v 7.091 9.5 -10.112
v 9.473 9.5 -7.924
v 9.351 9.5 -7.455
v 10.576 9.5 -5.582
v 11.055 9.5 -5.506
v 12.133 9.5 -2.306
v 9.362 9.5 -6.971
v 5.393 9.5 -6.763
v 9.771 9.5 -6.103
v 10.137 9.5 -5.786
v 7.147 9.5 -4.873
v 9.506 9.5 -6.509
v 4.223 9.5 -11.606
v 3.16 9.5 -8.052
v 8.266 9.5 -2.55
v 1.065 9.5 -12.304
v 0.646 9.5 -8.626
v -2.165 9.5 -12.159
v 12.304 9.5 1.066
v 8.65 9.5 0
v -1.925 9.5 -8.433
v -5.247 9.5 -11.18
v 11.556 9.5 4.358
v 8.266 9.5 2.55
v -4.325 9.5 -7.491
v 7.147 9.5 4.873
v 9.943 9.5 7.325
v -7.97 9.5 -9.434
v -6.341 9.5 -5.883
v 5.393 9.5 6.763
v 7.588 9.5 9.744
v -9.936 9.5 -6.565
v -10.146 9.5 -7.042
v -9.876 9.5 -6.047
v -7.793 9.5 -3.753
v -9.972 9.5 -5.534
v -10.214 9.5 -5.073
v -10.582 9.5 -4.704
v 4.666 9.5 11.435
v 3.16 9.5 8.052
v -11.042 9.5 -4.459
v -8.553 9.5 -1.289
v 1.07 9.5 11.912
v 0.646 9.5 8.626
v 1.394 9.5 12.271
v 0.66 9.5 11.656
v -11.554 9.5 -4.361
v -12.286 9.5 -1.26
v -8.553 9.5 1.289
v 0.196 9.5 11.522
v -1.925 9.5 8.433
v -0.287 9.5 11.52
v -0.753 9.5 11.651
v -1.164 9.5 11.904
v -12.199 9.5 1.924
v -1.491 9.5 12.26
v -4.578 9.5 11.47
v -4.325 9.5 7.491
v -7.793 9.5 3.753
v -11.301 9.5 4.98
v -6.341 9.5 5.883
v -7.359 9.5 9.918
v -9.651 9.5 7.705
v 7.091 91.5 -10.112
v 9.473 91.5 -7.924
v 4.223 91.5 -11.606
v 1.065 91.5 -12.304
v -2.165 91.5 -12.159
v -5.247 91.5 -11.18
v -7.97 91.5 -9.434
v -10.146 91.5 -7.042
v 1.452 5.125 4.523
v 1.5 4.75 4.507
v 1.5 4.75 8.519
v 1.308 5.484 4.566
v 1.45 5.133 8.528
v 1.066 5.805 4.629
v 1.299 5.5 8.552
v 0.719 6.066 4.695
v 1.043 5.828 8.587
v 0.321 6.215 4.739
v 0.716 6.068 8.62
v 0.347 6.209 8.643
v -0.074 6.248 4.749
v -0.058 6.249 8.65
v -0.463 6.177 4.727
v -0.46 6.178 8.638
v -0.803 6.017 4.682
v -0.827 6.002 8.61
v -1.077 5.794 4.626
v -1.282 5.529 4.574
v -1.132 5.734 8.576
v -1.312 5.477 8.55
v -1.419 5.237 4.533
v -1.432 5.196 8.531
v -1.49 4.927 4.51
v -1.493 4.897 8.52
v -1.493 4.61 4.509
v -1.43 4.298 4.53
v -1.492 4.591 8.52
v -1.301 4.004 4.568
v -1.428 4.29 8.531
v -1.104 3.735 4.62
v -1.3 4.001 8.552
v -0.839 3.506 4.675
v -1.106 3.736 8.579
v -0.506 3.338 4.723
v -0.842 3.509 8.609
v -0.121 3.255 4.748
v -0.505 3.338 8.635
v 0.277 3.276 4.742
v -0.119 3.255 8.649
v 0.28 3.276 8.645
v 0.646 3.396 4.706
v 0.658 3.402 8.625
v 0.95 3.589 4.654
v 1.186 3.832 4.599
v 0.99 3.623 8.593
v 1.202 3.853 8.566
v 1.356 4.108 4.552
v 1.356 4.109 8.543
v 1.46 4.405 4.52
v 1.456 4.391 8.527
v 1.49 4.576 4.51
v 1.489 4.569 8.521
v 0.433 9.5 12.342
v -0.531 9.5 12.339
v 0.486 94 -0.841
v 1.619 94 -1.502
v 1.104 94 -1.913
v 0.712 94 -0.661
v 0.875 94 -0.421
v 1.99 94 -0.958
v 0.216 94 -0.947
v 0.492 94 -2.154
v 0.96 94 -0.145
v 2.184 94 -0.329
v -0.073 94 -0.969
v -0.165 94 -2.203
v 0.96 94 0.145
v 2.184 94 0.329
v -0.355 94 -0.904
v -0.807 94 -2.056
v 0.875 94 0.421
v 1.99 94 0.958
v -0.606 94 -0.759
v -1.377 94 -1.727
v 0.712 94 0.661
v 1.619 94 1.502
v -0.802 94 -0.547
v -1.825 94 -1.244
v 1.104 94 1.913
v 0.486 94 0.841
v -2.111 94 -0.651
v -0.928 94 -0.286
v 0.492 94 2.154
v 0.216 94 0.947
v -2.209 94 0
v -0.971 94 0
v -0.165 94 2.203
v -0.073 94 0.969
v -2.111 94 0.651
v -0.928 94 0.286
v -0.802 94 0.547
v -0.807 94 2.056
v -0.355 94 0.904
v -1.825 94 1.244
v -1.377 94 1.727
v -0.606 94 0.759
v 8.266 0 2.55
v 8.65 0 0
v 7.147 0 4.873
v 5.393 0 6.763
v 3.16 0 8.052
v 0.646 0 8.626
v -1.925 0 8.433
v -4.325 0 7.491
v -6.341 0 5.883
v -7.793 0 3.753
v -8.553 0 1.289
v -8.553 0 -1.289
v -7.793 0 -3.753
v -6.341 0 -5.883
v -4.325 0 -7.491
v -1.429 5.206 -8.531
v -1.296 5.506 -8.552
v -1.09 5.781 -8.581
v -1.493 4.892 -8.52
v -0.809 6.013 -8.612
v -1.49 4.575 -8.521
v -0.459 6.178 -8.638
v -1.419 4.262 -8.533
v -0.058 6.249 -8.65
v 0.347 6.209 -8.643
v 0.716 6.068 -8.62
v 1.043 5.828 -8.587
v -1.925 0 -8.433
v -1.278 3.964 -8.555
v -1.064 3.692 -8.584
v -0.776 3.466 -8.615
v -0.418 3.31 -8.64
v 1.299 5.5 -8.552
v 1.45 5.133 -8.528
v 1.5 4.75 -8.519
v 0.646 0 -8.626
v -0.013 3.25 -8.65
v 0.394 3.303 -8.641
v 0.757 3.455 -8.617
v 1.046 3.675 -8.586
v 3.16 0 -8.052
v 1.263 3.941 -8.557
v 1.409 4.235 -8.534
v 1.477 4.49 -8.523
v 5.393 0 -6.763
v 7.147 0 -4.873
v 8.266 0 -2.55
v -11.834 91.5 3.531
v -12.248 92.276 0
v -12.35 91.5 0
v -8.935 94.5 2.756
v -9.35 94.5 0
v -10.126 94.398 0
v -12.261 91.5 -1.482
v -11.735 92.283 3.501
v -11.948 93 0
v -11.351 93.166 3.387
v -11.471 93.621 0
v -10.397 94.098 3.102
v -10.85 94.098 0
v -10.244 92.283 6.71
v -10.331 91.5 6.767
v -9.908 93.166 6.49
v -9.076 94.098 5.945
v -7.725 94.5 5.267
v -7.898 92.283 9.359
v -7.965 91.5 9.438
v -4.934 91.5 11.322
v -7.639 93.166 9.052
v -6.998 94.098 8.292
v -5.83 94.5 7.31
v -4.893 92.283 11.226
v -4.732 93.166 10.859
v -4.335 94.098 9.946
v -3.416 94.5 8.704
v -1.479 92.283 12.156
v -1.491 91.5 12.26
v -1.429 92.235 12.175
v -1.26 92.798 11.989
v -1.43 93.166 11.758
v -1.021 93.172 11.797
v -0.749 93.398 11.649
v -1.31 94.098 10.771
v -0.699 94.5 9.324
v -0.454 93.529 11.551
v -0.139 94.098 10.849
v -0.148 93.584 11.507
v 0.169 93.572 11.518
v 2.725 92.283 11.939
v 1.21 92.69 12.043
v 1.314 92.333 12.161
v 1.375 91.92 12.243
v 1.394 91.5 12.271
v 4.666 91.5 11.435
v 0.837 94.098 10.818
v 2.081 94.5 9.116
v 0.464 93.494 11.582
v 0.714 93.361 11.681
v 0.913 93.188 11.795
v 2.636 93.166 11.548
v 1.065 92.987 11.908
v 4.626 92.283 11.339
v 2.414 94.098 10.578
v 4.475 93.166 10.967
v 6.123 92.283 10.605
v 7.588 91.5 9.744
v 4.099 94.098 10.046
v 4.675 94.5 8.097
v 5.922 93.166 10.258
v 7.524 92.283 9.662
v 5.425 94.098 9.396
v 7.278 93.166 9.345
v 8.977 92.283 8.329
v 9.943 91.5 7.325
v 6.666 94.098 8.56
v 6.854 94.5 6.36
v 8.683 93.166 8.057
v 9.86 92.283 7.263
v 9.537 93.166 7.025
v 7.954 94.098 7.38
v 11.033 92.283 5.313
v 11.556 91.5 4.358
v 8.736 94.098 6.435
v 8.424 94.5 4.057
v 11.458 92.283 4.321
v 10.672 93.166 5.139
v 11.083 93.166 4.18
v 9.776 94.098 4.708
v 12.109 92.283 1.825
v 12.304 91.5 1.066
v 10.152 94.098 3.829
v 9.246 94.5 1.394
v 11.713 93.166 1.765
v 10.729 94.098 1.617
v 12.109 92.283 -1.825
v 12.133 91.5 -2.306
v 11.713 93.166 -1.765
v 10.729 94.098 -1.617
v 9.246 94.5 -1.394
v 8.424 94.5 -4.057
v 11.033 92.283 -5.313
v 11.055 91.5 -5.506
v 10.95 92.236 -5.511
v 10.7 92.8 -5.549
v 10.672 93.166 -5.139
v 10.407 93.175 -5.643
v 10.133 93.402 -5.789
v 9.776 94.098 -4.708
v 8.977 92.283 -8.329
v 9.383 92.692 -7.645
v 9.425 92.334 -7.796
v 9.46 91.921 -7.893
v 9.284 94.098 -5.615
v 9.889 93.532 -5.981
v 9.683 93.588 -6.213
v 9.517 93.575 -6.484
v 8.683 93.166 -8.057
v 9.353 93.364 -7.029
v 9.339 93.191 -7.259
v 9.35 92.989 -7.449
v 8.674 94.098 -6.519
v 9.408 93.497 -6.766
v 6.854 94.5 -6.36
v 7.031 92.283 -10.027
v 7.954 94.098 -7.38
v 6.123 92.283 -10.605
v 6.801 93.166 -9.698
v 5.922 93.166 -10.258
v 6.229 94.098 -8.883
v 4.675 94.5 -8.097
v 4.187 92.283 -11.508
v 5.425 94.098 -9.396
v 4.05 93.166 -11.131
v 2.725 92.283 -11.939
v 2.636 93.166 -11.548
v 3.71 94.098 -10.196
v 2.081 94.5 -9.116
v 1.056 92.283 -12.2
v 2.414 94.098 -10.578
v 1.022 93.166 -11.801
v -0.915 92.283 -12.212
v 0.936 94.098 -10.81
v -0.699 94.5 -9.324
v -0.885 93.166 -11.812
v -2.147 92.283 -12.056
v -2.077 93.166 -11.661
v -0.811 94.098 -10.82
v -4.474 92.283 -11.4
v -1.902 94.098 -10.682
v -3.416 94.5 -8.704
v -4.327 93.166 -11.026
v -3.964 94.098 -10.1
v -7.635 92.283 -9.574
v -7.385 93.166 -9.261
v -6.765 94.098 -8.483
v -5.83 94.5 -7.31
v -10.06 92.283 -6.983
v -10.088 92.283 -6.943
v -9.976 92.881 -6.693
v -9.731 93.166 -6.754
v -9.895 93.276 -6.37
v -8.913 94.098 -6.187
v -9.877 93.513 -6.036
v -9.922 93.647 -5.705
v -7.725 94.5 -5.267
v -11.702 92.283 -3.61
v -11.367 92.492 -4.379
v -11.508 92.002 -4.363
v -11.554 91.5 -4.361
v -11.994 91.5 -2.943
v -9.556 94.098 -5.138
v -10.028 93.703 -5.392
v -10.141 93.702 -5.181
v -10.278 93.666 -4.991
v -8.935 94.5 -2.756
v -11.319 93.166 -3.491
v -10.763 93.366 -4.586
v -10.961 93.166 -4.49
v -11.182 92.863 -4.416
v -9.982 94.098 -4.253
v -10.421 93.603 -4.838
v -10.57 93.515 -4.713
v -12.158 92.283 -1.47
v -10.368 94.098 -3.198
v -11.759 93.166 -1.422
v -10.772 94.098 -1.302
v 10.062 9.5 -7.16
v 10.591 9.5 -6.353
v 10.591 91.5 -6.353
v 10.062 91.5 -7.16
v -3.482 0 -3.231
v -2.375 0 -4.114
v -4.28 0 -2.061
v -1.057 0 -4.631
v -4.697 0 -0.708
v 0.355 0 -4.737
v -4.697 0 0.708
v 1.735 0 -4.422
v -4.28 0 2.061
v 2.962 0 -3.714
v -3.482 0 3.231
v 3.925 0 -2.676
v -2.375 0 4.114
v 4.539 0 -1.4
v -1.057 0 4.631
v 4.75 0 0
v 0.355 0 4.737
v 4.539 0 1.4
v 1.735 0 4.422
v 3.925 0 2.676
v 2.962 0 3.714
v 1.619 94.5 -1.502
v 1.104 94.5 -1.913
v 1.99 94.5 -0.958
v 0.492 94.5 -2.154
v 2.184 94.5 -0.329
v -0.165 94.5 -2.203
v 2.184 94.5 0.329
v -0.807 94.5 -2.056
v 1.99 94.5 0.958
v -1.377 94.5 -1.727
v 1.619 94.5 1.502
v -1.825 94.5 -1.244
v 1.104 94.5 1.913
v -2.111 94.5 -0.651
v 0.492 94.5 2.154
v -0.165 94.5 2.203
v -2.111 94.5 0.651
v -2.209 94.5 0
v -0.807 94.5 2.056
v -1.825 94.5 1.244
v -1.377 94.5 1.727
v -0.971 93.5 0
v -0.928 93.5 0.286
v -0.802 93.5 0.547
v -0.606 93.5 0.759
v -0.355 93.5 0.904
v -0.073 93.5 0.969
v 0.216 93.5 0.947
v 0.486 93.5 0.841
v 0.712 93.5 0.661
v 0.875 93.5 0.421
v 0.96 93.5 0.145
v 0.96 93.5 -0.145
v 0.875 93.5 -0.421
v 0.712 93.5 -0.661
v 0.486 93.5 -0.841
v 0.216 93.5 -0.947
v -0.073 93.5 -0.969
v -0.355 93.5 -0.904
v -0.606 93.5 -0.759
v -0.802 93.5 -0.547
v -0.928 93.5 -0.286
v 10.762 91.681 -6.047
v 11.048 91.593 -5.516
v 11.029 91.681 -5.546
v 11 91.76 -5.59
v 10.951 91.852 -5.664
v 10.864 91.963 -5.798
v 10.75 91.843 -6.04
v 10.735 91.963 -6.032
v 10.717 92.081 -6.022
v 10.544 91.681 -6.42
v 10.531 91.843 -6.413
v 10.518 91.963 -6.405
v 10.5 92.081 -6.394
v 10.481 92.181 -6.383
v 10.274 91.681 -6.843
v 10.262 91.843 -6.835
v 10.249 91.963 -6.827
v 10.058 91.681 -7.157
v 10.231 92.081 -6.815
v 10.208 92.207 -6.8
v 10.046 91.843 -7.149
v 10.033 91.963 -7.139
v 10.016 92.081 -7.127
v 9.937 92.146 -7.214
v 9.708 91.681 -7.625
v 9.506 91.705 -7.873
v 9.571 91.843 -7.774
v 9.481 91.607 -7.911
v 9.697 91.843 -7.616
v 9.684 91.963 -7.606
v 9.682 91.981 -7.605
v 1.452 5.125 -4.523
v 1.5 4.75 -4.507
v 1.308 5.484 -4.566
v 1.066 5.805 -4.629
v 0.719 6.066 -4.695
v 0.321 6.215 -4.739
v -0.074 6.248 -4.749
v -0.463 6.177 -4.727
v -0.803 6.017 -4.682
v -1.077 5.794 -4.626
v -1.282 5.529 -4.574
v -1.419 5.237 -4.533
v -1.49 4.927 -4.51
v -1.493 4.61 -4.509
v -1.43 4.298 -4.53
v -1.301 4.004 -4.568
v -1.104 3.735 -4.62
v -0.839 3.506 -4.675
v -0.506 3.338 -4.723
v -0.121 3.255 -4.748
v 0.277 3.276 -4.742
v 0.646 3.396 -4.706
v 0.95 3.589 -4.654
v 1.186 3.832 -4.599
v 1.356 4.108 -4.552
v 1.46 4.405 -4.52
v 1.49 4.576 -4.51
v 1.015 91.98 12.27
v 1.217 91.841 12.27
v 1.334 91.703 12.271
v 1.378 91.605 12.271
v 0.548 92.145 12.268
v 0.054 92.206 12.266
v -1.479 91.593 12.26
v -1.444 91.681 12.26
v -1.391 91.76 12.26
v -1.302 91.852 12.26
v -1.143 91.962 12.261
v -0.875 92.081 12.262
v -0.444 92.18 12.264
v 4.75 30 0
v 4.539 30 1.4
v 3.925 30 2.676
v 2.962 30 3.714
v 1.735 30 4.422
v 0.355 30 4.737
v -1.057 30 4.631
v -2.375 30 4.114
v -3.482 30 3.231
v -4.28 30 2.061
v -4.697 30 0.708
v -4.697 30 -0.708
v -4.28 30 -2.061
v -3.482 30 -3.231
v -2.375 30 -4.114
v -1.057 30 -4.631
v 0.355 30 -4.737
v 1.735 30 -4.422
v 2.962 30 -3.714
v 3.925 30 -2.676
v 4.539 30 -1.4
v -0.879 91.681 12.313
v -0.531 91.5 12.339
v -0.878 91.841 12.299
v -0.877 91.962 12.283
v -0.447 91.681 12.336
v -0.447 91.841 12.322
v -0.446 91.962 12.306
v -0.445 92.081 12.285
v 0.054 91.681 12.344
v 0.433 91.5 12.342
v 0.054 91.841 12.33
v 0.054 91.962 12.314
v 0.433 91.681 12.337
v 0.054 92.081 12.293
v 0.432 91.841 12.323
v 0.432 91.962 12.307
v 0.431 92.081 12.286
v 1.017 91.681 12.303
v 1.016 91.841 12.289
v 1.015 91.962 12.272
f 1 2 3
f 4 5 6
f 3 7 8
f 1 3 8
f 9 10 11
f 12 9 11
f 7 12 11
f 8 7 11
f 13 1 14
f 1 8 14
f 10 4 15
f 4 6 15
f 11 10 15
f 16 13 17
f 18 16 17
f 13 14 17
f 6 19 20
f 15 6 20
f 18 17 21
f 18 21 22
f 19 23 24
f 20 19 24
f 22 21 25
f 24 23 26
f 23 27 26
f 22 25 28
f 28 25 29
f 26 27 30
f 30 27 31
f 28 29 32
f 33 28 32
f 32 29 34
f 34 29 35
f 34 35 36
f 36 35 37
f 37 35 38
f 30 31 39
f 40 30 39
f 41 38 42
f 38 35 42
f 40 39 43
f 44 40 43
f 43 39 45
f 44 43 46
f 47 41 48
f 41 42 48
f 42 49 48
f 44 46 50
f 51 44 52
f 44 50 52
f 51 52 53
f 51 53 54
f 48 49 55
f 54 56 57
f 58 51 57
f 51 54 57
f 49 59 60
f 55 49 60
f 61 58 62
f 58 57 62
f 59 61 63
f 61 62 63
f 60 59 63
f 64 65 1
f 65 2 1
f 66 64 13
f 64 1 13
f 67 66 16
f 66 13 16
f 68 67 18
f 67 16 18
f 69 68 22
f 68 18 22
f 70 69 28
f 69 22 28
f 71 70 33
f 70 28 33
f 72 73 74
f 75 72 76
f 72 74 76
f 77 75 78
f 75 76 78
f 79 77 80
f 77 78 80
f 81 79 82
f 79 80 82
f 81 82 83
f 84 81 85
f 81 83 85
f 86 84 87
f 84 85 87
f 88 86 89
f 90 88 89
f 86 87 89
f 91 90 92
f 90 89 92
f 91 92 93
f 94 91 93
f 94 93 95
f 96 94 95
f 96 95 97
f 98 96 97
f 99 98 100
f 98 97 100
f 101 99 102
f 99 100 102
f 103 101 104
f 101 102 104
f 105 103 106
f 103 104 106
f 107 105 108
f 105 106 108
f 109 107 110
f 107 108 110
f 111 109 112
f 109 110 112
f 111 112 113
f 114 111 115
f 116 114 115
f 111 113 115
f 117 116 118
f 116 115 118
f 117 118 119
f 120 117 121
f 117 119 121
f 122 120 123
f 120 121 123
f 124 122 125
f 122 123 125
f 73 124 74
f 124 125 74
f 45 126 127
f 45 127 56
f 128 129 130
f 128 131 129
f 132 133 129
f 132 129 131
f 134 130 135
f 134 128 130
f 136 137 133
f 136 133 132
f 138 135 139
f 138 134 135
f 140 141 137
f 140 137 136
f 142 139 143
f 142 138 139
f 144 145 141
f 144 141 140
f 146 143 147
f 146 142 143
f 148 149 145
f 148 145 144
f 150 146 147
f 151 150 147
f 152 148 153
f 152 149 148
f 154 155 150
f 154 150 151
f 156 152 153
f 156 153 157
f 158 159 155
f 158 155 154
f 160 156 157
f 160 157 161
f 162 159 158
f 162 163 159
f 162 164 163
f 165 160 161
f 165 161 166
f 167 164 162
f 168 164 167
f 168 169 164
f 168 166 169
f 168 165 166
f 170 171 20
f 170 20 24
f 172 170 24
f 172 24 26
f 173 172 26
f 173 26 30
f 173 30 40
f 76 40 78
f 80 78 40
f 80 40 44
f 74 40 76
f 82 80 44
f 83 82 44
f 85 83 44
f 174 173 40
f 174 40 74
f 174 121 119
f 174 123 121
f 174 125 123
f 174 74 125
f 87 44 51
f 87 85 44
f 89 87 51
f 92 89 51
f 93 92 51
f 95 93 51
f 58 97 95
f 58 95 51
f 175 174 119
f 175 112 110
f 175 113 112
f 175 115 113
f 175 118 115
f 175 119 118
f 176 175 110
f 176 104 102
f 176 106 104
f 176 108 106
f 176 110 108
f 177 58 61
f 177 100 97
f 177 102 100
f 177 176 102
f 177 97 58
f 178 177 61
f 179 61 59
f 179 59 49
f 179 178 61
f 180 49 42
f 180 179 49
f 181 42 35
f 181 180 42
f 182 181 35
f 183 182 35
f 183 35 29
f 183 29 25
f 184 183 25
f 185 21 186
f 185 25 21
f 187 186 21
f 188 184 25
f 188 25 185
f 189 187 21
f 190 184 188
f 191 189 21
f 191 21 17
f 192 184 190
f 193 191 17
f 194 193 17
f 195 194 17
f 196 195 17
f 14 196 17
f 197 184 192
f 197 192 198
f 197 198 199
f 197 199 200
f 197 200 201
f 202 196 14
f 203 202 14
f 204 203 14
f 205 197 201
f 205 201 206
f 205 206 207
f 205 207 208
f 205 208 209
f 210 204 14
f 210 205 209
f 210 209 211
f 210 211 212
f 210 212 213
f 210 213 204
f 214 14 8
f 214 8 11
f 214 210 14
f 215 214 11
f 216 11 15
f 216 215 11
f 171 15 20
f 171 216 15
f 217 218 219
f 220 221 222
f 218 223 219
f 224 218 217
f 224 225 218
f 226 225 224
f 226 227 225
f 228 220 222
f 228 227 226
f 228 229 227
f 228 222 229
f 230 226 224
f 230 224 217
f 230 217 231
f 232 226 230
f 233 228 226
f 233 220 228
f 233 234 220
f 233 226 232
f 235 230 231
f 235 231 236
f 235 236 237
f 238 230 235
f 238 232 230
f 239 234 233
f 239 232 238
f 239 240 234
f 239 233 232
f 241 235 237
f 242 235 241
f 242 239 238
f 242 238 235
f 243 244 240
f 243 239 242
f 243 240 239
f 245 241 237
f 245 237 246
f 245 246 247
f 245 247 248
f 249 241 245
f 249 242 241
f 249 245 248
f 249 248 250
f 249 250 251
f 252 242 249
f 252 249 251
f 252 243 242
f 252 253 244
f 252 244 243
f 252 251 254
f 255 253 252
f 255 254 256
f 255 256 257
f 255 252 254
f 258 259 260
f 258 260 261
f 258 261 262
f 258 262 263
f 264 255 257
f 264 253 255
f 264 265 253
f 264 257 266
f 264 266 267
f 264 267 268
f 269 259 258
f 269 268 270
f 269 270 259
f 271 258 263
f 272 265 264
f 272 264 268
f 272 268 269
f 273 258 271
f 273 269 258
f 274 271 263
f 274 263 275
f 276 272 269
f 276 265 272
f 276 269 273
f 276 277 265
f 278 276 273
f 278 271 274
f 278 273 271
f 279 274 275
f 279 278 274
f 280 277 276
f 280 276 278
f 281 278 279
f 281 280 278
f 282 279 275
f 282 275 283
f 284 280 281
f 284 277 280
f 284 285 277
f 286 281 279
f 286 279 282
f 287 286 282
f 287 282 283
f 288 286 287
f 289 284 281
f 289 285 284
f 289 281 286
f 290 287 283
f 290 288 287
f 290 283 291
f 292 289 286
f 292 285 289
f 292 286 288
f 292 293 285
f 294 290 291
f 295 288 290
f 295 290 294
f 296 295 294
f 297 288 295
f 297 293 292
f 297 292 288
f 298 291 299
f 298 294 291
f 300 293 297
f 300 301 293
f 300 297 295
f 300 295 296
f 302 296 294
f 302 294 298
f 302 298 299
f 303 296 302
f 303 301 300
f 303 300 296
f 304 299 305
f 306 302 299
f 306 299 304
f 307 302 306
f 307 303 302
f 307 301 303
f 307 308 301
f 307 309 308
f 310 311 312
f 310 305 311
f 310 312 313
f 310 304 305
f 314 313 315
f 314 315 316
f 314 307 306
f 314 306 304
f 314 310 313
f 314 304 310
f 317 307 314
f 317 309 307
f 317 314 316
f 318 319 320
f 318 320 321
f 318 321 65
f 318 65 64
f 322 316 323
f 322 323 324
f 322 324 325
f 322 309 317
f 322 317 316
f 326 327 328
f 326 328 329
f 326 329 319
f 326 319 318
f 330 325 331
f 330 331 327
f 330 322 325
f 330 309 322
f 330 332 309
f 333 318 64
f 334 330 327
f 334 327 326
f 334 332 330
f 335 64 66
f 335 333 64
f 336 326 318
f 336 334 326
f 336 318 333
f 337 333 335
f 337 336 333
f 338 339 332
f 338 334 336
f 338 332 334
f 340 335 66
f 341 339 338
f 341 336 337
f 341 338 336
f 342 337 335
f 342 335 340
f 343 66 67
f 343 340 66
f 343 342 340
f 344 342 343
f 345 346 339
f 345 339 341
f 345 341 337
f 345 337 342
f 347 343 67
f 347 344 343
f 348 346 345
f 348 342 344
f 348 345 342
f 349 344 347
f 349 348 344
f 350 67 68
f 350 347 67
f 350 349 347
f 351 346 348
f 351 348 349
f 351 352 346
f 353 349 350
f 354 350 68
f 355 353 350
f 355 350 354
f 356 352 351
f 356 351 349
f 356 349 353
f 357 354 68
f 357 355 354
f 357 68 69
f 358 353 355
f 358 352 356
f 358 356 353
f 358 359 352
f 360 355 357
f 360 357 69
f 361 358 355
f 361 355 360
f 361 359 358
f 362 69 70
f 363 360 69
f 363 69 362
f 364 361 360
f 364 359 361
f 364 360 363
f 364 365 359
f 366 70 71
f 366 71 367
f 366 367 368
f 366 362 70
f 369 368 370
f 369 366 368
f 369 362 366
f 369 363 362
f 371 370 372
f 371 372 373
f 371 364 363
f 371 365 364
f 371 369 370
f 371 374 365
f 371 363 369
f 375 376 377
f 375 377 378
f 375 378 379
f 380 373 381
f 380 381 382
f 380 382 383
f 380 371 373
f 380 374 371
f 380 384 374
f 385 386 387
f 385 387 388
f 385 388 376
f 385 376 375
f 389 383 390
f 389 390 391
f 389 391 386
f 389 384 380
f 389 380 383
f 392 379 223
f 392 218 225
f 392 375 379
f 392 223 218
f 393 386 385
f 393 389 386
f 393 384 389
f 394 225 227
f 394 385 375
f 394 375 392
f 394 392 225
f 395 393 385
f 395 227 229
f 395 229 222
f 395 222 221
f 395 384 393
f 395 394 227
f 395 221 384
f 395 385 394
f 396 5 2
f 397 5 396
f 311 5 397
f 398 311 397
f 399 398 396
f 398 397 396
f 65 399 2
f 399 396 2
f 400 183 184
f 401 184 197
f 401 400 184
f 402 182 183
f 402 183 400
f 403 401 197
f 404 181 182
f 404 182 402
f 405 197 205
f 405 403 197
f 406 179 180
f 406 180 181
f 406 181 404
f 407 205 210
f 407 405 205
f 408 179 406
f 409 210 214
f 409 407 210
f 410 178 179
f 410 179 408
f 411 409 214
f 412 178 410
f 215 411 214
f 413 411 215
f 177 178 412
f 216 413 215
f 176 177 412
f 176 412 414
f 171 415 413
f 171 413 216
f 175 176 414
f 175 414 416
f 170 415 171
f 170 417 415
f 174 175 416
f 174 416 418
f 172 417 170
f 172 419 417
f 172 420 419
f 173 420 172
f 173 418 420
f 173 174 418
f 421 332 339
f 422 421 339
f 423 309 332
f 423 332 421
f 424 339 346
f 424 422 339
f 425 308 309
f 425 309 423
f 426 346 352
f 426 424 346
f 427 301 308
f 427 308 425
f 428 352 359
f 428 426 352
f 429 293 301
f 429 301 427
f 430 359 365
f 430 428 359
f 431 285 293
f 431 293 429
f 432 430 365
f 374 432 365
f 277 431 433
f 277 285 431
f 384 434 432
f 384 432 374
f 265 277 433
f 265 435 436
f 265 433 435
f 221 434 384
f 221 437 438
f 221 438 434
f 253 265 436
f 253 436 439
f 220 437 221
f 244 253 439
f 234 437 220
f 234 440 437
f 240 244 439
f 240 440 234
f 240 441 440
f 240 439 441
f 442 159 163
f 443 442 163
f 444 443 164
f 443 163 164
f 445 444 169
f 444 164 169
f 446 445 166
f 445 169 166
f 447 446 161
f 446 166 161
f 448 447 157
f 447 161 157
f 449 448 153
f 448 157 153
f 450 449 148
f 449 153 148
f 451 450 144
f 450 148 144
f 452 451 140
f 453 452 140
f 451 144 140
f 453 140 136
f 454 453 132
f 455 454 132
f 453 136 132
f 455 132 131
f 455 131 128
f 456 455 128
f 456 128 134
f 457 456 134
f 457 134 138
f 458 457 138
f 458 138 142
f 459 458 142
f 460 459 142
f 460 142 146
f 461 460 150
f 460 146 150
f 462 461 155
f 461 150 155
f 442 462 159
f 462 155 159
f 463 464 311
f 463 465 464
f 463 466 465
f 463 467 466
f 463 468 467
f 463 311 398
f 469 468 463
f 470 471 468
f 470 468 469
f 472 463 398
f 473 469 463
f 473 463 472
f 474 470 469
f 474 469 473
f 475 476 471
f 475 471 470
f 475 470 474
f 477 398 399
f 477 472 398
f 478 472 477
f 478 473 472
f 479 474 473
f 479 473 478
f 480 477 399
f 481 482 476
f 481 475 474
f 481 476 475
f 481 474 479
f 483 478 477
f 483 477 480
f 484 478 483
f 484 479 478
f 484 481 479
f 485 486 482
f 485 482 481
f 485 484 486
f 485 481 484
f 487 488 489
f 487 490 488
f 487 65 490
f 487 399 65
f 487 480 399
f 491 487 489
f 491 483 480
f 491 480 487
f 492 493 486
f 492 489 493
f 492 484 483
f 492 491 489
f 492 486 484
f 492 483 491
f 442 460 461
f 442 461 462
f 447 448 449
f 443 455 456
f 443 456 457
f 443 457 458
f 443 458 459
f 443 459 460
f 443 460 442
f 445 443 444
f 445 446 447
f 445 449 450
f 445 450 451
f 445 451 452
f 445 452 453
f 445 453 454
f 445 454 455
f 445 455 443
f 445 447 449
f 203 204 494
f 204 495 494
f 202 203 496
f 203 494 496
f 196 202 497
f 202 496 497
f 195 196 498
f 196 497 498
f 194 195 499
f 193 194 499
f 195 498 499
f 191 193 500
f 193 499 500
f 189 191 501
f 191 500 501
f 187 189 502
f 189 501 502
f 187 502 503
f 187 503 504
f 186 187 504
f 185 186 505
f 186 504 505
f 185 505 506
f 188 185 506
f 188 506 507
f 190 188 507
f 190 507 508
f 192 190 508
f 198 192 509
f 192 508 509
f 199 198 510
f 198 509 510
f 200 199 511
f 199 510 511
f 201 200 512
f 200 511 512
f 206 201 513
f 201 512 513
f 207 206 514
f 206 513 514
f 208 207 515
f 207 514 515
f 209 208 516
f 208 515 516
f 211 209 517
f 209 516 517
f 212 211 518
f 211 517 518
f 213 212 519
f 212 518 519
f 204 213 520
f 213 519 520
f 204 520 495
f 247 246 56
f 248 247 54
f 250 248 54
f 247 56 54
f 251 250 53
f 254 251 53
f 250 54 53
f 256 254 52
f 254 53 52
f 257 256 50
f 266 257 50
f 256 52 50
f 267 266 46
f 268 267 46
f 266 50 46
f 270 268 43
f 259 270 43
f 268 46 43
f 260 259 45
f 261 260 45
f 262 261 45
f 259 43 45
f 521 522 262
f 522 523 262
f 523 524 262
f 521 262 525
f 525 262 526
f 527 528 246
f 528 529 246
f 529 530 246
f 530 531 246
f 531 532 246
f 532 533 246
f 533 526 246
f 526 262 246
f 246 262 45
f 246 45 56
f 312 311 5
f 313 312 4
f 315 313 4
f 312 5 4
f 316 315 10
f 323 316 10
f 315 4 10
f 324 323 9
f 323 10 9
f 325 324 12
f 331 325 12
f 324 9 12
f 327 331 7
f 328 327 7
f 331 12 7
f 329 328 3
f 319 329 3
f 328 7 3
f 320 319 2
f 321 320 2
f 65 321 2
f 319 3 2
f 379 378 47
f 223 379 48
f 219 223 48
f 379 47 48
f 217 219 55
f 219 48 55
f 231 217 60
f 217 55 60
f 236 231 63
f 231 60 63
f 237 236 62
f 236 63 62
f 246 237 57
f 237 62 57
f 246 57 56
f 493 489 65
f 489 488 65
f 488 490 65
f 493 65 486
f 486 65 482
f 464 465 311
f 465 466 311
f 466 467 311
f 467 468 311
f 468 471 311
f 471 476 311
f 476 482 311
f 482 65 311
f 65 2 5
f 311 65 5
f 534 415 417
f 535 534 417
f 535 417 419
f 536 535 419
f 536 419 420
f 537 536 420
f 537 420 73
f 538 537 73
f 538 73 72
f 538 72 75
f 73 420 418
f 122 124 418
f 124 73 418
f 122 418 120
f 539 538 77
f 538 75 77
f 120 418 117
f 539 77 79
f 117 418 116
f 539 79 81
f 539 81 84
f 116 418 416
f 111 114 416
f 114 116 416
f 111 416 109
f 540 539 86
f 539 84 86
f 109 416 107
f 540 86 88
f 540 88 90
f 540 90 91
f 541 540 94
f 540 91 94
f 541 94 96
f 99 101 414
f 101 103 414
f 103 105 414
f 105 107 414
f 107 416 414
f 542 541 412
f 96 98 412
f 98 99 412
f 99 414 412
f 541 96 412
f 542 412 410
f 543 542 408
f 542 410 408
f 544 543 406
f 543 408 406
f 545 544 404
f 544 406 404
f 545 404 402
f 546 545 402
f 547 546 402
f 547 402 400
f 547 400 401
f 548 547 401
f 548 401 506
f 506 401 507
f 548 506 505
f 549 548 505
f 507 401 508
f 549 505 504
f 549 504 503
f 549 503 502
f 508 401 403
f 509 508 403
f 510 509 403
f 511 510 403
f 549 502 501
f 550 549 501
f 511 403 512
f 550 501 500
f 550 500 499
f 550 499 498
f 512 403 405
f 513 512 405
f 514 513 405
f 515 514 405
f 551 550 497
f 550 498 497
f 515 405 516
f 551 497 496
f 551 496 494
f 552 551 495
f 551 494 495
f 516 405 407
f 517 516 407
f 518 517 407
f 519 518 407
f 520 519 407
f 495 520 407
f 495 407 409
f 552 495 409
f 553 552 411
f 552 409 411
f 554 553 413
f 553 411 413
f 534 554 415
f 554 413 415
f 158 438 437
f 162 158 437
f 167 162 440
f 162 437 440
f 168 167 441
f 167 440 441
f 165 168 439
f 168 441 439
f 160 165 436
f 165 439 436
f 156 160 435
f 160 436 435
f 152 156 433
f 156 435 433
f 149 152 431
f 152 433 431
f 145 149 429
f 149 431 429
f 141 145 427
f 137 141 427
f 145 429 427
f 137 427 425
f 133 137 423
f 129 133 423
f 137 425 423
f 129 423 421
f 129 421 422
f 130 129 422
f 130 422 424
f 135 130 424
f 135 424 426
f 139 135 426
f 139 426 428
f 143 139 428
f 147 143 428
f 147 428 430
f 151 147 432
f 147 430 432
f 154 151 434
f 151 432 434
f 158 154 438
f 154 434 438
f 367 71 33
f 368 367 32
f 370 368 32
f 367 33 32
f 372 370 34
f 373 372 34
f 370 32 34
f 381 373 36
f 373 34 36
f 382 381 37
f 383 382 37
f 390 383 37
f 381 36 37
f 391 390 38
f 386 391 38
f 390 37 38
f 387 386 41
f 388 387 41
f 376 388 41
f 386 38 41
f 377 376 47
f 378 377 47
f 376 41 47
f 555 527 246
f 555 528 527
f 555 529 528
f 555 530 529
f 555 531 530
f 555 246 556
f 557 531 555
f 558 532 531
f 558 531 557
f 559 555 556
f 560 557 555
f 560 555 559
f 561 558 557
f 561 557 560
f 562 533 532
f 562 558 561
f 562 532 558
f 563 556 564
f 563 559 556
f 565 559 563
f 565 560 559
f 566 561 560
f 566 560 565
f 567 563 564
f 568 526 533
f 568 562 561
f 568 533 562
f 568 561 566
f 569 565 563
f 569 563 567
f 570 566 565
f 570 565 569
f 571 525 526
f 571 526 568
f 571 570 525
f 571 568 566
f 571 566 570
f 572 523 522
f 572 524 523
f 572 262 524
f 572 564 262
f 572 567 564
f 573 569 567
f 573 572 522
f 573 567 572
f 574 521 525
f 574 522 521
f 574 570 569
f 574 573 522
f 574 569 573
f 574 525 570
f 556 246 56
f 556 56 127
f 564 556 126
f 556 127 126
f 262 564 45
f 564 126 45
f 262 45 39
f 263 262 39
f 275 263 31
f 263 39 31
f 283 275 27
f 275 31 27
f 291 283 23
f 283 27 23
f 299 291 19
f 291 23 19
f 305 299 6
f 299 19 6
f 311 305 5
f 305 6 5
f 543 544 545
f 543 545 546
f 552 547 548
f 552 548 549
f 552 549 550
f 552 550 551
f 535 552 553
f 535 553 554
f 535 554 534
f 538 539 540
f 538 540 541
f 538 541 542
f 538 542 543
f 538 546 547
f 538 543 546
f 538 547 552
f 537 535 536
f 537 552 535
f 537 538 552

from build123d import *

# Parameters (mm, degrees)
F0_R      = 8.65
F0_R_2    = 4.75
F1_DEPTH  = 9.5
F2_R      = 12.35
F3_DEPTH  = 85
F4_R      = 4.75
F5_DEPTH  = 30
F6_R      = 3
F7_R      = 2.2089362083
F8_DEPTH  = 0.5
F9_R      = 0.9712597181
F10_DEPTH = 0.5
F12_DEPTH = 100
F13_R     = 1.5
F14_DEPTH = 50


with BuildPart() as f1:
    # F0 (on Front) → F1 (new body)
    with BuildSketch(Plane.XZ):
        Circle(F0_R)
        Circle(F0_R_2, mode=Mode.SUBTRACT)
        Circle(F0_R_2)
    extrude(amount=-F1_DEPTH)

    # F2 (on face) → F3 (join)
    with BuildSketch(Plane(origin=(0, 9.5, 0), x_dir=(-1, 0, 0), z_dir=(0, 1, 0))):
        Circle(F2_R)
    extrude(amount=F3_DEPTH)

    # F4 (on face) → F5 (cut)
    with BuildSketch(Plane.XZ):
        Circle(F4_R)
    extrude(amount=-F5_DEPTH, mode=Mode.SUBTRACT)

    # F6
    f6_edges = [f1.edges().sort_by_distance(p)[0] for p in [
        (12.35, 94.5, 0),
    ]]
    fillet(f6_edges, radius=F6_R)

    # F7 (on face) → F8 (cut)
    with BuildSketch(Plane(origin=(0, 94.5, 0), x_dir=(-1, 0, 0), z_dir=(0, 1, 0))):
        Circle(F7_R)
    extrude(amount=-F8_DEPTH, mode=Mode.SUBTRACT)

    # F9 (on face) → F10 (cut)
    with BuildSketch(Plane(origin=(0, 94, 0), x_dir=(-1, 0, 0), z_dir=(0, 1, 0))):
        Circle(F9_R)
    extrude(amount=-F10_DEPTH, mode=Mode.SUBTRACT)

    # F11 (on face) → F12 (cut)
    with BuildSketch(Plane.XZ.offset(-9.5)):
        with BuildLine():
            Line((1.3943195239, 12.2710379783), (-1.4912584729, 12.2596349117))
            ThreePointArc((-1.4912584729, 12.2596349117), (-0.0454618315, 11.5042439534), (1.3943195239, 12.2710379783))
        make_face()
        with BuildLine():
            Line((9.4725158679, -7.9242629394), (11.0546471813, -5.5061125757))
            ThreePointArc((11.0546471813, -5.5061125757), (9.6241530869, -6.2968267783), (9.4725158679, -7.9242629394))
        make_face()
        with BuildLine():
            ThreePointArc((-10.145604716, -7.0419603057), (-10.0757006279, -5.2946209032), (-11.5543855714, -4.3610404798))
            ThreePointArc((-11.5543855714, -4.3610404798), (-10.9324849598, -5.744847483), (-10.145604716, -7.0419603057))
        make_face()
    extrude(amount=-F12_DEPTH, mode=Mode.SUBTRACT)

    # F13 (on Top) → F14 (cut, symmetric)
    with BuildSketch(Plane.XY):
        with Locations((0, 4.75)):
            Circle(F13_R)
    extrude(amount=F14_DEPTH, both=True, mode=Mode.SUBTRACT)


solid = f1.part
